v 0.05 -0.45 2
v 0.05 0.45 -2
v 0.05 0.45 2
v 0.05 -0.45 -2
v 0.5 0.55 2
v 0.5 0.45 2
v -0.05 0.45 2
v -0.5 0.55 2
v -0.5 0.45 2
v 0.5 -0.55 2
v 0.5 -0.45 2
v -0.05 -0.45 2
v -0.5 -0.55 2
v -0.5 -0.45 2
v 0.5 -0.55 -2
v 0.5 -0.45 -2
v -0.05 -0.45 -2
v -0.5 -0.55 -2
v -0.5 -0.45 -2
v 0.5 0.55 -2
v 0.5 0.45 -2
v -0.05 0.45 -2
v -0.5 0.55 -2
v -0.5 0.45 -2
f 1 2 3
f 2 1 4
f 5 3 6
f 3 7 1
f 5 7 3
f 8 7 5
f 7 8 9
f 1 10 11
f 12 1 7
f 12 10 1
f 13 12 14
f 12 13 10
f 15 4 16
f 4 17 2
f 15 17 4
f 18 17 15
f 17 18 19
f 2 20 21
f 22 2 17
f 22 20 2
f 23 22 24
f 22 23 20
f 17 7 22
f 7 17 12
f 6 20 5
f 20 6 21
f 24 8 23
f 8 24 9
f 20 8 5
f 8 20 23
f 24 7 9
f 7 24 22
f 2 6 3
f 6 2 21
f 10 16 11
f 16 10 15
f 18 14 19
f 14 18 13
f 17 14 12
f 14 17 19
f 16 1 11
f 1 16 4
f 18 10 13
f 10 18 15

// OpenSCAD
module Beam_T(){
    
    color("#CCCCCC"){
cube([0.1,1,4], center =true);

translate([0,0.5,0])
cube([1,0.1,4], center =true);

translate([0,-0.5,0])
cube([1,0.1,4], center =true);
        }
    }

Beam_T();
